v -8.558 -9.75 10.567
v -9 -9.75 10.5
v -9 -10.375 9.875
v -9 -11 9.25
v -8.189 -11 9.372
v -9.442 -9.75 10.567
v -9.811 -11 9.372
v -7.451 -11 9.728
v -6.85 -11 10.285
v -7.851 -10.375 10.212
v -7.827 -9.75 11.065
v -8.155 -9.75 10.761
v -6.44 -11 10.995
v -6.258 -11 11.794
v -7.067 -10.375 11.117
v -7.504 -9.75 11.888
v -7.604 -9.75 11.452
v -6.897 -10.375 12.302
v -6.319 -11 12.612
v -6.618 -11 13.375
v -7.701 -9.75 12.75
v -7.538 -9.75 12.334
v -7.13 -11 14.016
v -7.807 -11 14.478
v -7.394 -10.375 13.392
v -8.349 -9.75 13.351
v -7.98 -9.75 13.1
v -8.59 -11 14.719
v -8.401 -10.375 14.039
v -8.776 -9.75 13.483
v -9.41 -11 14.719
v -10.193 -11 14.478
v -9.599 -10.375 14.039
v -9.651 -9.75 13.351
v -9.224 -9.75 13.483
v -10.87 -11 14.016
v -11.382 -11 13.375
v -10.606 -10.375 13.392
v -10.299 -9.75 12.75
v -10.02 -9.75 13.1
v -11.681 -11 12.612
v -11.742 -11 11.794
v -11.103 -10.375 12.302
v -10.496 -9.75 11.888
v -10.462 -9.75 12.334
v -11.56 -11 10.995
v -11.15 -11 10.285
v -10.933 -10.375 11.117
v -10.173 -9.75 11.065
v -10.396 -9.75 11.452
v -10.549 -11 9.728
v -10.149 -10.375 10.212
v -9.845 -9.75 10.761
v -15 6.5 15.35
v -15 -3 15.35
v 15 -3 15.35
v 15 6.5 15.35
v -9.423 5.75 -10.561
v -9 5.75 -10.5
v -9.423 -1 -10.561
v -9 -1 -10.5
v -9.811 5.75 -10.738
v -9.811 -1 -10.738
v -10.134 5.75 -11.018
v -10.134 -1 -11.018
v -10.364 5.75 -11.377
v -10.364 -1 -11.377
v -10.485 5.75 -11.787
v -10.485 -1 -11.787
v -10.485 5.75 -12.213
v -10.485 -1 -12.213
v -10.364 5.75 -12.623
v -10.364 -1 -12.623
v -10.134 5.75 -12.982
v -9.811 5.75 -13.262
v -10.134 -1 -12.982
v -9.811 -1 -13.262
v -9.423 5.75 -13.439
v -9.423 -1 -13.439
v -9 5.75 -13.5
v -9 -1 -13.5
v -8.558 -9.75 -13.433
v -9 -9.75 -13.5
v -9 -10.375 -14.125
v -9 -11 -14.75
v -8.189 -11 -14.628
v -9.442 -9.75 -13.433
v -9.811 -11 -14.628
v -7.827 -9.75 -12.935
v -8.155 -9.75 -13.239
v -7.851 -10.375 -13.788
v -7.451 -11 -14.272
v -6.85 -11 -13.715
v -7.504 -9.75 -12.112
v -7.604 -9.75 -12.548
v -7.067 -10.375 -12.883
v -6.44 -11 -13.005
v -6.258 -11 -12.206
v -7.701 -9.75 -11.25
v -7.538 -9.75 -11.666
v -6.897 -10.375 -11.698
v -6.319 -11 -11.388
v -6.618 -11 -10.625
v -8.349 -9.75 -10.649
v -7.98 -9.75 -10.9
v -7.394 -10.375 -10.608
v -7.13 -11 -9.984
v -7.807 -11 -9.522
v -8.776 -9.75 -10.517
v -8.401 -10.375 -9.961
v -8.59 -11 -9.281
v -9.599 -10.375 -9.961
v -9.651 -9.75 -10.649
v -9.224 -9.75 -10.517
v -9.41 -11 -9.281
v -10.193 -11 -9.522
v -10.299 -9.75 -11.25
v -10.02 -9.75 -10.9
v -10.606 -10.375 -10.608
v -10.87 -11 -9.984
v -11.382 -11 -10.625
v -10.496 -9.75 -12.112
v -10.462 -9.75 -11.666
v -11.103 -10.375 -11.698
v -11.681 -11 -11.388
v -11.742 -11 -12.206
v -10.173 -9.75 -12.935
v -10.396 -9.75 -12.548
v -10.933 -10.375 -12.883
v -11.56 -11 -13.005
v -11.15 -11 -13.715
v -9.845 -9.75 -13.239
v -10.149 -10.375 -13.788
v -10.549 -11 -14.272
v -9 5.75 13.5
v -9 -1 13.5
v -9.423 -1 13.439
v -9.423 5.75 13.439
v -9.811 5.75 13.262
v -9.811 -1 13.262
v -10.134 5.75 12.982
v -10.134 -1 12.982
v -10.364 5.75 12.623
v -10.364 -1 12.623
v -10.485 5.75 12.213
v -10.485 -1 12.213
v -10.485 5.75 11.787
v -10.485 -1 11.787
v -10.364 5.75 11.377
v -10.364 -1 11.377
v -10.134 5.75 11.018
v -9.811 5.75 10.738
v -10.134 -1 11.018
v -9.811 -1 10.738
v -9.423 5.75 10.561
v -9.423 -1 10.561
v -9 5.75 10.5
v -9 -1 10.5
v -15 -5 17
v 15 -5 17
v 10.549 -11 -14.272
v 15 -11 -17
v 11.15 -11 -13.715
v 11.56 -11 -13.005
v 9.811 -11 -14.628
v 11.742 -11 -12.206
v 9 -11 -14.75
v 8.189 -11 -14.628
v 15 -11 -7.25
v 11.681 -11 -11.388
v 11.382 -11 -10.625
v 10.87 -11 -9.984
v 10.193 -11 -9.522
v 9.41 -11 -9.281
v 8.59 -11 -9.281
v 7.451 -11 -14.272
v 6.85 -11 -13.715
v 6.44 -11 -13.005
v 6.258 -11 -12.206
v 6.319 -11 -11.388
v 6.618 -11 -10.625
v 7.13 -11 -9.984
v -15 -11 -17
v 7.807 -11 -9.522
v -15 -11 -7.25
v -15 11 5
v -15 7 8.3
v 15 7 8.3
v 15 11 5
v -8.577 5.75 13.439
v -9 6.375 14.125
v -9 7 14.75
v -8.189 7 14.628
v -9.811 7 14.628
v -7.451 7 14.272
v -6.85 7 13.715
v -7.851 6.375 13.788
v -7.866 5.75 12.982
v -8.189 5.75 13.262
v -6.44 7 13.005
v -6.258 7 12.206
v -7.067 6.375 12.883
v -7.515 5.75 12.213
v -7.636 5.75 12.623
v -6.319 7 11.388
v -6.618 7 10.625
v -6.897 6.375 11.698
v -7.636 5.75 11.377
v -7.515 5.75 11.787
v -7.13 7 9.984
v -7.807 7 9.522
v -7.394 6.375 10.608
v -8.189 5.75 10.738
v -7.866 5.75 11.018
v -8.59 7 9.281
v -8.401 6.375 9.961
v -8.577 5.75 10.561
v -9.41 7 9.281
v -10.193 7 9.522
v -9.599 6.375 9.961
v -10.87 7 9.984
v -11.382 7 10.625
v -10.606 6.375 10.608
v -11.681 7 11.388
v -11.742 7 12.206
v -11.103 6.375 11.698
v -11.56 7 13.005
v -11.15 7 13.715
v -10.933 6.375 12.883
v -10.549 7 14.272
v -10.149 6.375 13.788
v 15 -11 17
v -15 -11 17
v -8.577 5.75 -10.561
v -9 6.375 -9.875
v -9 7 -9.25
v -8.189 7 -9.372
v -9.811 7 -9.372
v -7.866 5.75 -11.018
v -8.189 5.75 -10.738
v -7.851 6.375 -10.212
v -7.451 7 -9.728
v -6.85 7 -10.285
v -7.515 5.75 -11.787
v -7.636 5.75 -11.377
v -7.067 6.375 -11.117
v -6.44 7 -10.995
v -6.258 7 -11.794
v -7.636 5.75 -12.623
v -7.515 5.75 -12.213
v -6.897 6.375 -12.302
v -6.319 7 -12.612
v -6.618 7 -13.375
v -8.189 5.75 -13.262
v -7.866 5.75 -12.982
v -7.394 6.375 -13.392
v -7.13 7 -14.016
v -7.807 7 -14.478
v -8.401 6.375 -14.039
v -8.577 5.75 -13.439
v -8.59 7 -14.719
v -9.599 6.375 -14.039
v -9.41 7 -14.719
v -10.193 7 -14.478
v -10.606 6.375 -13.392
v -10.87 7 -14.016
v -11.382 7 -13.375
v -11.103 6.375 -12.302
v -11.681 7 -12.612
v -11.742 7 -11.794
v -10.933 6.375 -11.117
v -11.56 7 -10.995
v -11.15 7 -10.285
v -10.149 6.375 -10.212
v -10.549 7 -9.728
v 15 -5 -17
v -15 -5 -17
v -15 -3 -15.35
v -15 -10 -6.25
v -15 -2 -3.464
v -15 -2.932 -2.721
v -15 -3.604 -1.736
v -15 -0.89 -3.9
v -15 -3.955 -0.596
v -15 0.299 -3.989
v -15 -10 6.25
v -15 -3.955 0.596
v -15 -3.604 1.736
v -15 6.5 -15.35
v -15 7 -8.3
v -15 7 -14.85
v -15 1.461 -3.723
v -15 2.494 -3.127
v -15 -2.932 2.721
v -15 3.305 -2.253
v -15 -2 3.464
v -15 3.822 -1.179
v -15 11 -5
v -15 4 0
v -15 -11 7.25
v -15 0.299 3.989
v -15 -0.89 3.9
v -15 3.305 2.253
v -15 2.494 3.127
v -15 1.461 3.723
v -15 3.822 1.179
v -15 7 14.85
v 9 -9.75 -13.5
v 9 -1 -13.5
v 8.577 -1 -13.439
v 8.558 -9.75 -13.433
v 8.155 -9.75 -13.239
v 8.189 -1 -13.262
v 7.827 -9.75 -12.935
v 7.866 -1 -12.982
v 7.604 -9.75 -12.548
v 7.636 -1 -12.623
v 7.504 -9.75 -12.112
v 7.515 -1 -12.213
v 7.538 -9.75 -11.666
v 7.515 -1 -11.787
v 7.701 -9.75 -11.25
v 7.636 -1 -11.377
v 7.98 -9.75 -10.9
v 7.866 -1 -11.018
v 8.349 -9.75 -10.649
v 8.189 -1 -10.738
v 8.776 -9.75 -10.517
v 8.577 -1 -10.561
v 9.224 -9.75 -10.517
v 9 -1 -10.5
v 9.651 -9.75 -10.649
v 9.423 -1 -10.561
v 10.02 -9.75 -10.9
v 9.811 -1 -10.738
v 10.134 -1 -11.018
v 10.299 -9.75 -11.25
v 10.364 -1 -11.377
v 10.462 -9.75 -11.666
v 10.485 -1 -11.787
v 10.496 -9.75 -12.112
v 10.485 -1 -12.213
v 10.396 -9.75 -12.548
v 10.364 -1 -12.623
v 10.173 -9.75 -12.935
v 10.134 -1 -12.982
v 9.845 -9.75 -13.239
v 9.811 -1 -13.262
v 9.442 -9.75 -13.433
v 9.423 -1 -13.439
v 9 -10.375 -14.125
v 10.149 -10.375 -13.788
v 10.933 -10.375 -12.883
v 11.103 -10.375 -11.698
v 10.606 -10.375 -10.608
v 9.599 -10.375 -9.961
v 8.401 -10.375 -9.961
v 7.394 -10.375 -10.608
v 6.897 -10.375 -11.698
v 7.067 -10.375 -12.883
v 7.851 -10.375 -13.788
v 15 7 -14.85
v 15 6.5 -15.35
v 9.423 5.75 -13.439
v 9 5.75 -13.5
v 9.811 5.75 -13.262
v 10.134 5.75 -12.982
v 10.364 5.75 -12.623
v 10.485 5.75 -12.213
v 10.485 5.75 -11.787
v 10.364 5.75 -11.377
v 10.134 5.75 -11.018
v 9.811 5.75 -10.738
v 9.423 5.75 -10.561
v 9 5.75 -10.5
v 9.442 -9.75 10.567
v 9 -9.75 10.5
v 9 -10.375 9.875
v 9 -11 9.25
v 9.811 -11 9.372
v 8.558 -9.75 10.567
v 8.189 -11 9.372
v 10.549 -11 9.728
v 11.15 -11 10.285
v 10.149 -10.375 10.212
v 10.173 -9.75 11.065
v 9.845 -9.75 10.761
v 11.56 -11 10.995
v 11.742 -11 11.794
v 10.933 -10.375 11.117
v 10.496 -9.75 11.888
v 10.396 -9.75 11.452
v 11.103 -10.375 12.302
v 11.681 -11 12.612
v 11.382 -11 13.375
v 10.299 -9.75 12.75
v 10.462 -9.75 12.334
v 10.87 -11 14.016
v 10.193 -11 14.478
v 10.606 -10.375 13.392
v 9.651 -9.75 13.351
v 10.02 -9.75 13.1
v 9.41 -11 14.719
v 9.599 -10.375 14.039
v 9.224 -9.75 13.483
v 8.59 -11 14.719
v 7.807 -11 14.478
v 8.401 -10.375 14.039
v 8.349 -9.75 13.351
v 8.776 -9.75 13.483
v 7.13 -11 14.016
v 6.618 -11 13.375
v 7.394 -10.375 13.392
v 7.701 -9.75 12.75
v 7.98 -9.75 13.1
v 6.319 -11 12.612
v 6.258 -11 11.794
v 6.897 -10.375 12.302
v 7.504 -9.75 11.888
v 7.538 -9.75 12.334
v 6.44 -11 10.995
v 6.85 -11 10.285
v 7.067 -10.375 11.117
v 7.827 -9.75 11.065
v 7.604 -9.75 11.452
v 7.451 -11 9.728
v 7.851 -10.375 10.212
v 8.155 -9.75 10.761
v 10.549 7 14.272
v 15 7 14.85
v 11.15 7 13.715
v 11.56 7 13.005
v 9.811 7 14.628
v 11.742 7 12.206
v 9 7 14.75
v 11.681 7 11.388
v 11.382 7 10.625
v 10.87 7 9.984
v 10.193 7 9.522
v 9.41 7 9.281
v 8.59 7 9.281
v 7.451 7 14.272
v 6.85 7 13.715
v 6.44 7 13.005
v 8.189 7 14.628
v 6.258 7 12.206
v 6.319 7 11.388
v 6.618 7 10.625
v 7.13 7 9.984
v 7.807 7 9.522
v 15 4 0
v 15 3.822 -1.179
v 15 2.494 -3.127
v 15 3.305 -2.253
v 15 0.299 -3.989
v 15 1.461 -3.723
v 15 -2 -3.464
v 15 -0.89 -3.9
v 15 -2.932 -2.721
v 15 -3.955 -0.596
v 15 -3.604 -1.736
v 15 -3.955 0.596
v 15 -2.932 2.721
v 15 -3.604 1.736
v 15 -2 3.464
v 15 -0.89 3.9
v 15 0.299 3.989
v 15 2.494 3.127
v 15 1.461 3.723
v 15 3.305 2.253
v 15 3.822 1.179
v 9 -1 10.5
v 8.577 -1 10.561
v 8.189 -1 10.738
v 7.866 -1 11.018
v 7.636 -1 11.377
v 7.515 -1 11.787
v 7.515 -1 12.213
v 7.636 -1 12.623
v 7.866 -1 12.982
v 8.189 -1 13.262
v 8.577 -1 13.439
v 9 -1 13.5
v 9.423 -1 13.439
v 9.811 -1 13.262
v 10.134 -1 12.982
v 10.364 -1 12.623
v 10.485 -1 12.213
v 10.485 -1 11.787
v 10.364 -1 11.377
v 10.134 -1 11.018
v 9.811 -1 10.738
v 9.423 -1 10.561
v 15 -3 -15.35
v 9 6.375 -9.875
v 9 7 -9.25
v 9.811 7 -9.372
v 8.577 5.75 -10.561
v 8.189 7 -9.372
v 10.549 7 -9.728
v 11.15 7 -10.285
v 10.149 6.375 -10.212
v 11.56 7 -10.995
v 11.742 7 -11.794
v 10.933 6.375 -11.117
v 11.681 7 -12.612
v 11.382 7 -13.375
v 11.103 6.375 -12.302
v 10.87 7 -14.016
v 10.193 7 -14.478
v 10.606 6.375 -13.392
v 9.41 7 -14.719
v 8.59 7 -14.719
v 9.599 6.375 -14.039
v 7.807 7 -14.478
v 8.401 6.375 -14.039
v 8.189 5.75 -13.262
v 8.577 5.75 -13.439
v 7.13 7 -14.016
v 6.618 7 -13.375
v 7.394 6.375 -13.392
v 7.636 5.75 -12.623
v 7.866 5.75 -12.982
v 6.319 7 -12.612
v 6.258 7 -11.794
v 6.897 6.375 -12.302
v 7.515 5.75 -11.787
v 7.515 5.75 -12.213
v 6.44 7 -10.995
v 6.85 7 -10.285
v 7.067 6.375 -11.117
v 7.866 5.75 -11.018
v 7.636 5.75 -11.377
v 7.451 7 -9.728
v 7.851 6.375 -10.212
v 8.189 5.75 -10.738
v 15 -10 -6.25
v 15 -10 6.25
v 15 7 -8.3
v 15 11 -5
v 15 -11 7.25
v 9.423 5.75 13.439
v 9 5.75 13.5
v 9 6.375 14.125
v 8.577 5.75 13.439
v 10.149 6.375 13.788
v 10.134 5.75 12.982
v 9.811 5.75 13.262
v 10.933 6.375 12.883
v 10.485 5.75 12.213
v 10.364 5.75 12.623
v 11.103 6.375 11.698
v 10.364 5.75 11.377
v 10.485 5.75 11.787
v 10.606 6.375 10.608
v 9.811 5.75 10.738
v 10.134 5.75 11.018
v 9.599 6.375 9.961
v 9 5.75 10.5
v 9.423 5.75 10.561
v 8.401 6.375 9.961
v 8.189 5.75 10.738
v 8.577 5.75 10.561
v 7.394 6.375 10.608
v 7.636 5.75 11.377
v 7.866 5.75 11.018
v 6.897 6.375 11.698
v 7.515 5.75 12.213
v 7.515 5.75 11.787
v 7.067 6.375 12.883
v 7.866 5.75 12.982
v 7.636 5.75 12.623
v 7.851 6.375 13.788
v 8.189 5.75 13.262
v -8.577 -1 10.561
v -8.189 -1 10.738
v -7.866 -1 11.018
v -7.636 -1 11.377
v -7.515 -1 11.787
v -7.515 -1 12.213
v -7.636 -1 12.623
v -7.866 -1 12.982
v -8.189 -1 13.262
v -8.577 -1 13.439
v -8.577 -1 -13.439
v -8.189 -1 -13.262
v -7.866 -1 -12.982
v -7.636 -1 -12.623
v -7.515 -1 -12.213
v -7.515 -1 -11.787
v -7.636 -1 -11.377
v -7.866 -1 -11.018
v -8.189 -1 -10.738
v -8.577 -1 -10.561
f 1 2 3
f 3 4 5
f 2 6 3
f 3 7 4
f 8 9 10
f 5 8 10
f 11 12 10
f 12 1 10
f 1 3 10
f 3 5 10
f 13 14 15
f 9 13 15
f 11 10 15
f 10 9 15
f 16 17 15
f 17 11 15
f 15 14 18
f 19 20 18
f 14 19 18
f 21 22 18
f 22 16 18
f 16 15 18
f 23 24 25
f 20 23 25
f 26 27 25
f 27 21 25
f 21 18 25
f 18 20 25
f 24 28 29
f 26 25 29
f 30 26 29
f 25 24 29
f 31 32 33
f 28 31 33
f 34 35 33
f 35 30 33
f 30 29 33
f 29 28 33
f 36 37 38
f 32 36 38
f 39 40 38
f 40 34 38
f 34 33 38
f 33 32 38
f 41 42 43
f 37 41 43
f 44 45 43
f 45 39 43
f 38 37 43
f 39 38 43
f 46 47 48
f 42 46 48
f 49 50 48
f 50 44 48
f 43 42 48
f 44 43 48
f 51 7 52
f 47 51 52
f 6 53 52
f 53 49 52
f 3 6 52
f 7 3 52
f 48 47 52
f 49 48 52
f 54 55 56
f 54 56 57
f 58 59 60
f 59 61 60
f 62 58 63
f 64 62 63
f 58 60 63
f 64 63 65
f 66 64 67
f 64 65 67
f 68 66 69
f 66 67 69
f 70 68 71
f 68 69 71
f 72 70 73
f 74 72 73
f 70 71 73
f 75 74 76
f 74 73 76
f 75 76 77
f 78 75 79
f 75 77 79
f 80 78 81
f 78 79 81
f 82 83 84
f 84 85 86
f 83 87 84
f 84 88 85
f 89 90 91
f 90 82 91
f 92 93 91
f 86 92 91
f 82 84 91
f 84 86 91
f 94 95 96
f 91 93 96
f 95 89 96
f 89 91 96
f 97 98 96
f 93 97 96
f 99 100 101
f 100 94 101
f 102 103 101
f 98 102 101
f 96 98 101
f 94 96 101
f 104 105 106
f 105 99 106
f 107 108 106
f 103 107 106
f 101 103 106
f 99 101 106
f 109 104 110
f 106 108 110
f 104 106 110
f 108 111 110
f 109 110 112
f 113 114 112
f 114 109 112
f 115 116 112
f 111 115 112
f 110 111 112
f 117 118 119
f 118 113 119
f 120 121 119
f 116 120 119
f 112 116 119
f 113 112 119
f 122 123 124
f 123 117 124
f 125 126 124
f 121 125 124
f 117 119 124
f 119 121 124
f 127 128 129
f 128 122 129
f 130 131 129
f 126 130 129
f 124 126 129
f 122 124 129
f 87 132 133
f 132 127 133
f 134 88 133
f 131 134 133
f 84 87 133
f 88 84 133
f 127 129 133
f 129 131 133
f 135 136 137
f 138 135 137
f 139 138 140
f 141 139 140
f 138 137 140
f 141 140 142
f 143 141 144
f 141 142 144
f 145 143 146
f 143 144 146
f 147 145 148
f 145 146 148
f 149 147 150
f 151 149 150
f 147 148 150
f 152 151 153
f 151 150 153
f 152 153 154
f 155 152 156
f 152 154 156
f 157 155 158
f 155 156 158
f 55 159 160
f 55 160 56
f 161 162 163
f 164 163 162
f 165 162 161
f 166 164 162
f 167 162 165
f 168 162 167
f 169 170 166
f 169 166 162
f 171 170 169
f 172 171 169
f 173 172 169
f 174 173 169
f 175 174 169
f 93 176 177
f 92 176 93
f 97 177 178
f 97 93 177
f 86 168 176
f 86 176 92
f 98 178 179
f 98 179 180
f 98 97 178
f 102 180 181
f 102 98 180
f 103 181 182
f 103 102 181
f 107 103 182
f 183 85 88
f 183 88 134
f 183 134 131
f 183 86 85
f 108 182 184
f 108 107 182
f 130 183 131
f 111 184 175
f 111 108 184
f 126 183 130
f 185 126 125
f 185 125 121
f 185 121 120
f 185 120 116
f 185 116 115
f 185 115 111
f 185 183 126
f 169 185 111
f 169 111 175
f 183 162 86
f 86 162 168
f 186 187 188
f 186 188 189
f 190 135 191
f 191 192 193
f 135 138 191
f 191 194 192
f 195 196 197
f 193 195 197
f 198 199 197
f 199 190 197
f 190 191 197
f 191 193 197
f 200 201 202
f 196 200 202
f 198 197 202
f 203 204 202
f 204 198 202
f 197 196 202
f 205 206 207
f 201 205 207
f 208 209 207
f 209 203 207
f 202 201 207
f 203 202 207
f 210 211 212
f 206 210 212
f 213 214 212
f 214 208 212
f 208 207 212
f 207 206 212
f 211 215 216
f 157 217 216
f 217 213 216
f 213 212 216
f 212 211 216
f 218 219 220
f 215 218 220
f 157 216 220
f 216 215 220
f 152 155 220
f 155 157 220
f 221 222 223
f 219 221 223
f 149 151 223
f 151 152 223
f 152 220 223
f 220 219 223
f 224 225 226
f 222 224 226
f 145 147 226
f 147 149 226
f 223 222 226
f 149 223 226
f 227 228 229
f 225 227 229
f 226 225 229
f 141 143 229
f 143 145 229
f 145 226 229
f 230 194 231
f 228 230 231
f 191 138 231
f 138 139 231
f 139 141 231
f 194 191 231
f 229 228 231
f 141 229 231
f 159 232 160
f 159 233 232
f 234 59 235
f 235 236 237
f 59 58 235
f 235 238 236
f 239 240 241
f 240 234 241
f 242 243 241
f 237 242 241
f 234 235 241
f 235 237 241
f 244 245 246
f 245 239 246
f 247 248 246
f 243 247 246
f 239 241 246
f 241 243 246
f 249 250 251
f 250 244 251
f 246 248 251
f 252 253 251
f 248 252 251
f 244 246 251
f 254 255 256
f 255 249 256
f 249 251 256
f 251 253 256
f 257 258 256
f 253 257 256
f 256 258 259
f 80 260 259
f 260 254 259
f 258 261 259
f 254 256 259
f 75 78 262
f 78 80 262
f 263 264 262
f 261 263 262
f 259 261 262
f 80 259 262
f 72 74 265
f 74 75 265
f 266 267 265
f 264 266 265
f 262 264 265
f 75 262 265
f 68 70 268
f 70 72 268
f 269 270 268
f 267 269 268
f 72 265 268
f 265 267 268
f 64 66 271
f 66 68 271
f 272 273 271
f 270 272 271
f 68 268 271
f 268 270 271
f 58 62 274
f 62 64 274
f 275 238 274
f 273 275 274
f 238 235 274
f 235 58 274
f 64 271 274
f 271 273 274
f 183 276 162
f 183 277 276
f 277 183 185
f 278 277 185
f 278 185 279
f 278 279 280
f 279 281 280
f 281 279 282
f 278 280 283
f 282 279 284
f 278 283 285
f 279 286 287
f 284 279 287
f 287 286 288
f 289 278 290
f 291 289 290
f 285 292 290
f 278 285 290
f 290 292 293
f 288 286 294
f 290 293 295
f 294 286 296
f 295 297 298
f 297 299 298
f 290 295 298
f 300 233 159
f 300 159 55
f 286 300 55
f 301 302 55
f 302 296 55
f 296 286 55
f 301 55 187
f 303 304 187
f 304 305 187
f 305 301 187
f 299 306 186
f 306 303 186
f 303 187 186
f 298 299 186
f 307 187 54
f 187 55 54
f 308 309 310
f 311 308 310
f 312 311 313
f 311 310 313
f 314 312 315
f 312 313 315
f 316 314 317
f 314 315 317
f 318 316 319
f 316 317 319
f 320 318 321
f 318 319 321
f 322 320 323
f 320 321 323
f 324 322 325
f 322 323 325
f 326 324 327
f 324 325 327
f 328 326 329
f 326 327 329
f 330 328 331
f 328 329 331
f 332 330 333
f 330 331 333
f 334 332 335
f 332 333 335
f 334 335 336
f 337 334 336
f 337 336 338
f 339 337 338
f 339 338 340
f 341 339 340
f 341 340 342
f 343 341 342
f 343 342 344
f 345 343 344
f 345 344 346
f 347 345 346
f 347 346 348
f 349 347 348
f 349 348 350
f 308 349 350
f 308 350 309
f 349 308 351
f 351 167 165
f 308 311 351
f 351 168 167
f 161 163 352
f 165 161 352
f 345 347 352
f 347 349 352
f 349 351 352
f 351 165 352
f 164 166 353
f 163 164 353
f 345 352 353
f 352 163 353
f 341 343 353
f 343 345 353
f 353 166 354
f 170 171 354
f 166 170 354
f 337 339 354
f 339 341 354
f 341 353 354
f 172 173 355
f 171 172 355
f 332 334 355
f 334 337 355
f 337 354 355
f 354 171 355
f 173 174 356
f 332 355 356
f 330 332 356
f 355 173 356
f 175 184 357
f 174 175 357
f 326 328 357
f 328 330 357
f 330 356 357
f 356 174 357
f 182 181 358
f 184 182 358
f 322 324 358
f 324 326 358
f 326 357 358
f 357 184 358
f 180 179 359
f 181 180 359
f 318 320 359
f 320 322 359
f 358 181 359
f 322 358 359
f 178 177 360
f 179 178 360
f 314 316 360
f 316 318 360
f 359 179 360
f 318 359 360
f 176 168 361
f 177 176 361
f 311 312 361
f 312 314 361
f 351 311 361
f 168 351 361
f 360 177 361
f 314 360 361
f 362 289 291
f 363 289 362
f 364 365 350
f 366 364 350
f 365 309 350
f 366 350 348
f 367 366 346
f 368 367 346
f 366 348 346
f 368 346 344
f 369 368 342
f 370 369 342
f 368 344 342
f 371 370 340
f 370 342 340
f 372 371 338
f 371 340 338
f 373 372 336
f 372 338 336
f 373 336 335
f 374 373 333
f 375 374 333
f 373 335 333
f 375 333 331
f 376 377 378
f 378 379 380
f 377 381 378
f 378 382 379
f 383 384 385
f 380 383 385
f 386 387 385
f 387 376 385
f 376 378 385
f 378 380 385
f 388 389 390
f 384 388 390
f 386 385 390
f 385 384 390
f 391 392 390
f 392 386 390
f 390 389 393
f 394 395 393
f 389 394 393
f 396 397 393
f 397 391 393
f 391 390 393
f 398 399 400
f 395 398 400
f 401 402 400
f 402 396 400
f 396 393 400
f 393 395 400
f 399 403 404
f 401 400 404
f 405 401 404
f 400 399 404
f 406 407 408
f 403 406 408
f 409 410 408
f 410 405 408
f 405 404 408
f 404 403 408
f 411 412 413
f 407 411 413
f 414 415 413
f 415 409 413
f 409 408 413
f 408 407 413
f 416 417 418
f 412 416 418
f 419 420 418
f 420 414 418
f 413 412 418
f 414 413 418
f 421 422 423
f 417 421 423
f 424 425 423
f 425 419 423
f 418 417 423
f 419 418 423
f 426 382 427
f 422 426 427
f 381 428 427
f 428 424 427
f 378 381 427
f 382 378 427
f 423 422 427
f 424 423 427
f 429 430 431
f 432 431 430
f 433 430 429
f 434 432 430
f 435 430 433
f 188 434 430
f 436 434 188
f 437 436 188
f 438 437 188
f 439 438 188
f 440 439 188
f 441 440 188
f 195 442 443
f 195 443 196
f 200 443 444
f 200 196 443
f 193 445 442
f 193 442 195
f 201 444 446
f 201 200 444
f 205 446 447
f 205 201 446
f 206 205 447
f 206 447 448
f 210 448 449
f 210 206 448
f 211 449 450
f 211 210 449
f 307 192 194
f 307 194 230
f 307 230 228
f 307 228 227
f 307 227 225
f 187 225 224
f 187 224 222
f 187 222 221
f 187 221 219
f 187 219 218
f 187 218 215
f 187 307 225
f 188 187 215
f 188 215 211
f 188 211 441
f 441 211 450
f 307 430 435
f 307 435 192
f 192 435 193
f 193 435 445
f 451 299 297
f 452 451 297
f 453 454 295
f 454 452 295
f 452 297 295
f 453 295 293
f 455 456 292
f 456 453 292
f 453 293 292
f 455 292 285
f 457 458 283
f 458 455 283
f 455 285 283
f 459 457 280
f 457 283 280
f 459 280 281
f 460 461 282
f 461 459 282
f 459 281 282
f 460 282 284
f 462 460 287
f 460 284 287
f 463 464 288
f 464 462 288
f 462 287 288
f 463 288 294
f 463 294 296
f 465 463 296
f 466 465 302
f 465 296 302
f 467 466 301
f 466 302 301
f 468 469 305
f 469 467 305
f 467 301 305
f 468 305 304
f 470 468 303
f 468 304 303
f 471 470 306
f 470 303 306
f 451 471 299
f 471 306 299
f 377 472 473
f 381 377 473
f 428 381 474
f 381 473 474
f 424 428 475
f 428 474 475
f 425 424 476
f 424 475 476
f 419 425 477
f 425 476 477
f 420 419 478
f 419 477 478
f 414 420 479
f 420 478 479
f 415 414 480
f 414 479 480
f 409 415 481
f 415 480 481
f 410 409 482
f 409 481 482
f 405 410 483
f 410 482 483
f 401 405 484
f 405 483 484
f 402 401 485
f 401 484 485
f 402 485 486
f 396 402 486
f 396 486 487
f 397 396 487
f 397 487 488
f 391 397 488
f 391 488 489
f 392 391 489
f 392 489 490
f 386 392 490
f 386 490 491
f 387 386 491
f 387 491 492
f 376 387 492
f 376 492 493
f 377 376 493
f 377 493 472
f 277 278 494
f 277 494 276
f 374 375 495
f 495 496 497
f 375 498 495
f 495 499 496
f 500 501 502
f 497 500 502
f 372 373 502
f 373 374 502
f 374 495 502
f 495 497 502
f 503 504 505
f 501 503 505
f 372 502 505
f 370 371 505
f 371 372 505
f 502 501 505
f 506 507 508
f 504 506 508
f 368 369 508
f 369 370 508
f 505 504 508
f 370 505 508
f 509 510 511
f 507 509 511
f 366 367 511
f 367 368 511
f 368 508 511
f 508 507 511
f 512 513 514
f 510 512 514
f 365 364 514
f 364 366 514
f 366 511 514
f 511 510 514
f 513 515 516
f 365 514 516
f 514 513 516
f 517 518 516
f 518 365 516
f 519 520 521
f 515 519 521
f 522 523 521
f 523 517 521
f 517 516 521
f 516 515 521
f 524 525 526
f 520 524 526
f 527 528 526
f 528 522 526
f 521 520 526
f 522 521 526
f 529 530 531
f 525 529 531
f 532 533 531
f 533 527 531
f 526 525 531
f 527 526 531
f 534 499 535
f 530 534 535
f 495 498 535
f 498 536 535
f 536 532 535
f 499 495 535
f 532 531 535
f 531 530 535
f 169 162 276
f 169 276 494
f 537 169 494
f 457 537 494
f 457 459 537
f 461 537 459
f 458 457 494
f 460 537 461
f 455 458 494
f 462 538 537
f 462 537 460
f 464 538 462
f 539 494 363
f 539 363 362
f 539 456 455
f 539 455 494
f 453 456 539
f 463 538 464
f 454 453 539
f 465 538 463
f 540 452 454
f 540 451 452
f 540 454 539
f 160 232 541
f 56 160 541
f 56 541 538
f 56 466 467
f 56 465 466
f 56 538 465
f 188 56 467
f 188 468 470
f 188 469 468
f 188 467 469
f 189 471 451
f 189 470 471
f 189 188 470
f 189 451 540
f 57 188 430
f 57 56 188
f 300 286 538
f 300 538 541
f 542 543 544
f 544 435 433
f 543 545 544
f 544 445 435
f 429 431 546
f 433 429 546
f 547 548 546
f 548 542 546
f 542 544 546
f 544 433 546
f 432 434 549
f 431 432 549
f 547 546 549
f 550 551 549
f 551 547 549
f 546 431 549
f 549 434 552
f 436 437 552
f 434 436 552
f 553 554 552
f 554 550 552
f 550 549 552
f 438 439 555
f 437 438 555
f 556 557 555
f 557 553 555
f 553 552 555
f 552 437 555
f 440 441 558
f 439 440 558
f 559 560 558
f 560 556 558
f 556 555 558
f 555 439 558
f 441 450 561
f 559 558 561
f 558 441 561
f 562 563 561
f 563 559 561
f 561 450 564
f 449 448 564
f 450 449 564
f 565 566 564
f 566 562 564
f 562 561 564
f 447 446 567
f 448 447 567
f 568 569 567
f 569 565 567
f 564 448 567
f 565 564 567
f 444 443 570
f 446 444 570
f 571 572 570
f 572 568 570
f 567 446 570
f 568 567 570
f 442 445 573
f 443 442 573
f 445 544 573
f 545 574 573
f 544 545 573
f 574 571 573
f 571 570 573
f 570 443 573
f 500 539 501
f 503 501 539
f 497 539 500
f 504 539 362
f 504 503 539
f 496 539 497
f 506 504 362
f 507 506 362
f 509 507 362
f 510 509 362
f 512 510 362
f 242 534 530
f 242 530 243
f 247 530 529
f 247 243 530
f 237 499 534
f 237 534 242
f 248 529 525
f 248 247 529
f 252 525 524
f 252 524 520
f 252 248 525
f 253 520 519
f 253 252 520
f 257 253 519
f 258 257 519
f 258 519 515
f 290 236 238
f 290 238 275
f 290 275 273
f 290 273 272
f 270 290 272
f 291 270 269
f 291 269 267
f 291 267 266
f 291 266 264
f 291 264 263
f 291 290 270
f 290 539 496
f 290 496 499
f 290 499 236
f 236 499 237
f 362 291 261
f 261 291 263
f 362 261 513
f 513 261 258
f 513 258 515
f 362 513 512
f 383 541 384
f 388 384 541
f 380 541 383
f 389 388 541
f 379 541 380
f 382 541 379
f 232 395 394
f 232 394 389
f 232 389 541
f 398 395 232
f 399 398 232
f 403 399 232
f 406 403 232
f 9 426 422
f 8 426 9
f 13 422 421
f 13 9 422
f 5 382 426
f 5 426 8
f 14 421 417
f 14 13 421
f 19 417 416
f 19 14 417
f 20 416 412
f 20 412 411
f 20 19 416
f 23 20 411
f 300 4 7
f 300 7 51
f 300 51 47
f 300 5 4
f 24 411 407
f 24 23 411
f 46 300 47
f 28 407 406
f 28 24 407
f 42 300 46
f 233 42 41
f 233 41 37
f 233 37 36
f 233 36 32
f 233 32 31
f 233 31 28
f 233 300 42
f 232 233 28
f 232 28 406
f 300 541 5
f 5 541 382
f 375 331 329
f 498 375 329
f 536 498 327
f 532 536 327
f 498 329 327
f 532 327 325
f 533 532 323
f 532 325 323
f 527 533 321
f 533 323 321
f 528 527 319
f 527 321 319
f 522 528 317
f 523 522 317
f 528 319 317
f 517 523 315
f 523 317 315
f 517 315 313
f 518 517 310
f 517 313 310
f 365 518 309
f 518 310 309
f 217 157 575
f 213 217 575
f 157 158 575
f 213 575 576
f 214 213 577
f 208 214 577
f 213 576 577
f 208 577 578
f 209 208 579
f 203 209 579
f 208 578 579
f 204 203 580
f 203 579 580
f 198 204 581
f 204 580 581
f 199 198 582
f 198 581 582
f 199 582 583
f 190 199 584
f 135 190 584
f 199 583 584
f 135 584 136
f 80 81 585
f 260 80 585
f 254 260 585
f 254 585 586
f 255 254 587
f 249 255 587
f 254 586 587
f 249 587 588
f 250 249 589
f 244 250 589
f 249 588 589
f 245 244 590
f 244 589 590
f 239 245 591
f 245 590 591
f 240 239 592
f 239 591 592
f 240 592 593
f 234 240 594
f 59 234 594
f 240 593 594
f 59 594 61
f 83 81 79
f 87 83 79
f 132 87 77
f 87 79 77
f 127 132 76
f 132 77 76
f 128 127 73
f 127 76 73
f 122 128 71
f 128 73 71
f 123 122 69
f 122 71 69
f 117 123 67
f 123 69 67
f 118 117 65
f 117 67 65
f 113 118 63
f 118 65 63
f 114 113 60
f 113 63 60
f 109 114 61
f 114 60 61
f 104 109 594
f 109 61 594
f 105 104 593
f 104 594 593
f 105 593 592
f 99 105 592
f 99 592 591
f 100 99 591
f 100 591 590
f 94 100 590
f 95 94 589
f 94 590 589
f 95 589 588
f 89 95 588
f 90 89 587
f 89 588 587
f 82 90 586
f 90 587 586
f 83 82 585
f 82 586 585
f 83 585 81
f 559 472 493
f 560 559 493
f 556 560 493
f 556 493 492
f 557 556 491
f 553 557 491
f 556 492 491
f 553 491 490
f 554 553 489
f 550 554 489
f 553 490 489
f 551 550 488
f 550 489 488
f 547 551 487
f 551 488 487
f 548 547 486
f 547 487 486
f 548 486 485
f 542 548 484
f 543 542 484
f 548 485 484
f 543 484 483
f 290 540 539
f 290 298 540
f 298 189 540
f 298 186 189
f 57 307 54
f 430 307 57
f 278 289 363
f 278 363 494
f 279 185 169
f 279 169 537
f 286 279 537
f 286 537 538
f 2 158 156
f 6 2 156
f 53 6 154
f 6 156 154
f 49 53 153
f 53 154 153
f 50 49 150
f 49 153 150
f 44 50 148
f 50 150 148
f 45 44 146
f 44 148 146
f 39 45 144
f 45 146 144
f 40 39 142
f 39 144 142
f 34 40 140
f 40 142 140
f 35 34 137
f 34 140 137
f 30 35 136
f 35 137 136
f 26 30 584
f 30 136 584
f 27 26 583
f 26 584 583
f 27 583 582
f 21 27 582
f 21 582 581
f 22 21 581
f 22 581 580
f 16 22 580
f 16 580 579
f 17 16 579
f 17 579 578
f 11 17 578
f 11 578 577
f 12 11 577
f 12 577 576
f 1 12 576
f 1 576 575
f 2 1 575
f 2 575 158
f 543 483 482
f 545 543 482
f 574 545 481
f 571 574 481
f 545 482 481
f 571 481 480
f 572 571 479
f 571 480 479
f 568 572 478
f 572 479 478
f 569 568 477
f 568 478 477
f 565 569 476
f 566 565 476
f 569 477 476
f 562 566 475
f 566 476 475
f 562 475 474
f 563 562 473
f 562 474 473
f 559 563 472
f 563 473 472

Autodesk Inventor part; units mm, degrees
ref_plane "YZ Plane" through (0, 0, 0) normal (1, 0, 0) x (0, 1, 0)
ref_plane "XZ Plane" through (0, 0, 0) normal (0, 1, 0) x (-1, 0, 0)
ref_plane "XY Plane" through (0, 0, 0) normal (0, 0, 1) x (1, 0, 0)
sketch "Sketch1" plane through (0, 0, 0) normal (1, 0, 0) x (0, 1, 0)
  line L0 (14.2461, 0) -> (-14.2461, 0) construction
  line L1 (11, 5) -> (11, -5)
  line L2 (11, -5) -> (7, -8.3)
  line L3 (7, -8.3) -> (7, -15.35)
  line L4 (7, -15.35) -> (-3, -15.35)
  line L5 (-3, -15.35) -> (-5, -17)
  line L6 (-5, -17) -> (-11, -17)
  line L7 (-11, 17) -> (-5, 17)
  line L8 (-5, 17) -> (-3, 15.35)
  line L9 (-3, 15.35) -> (7, 15.35)
  line L10 (7, 15.35) -> (7, 8.3)
  line L11 (7, 8.3) -> (11, 5)
  line L12 (-11, -17) -> (-11, -7.25)
  line L13 (-11, -7.25) -> (-10, -6.25)
  line L14 (-10, -6.25) -> (-10, 6.25)
  line L15 (-10, 6.25) -> (-11, 7.25)
  line L16 (-11, 7.25) -> (-11, 17)
  circle A0 centre (0, 0) radius 4
  point P0 (-11, -12.125)
  dimension "d2" = 45
  dimension "d3" = 22
  dimension "d4" = 34
  dimension "d5" = 6
  dimension "d6" = 8
  dimension "d7" = 11
  dimension "d8" = 8
  dimension "d9" = 18
  dimension "d10" = 16.6
  dimension "d11" = 12.5
  dimension "d12" = 1
  dimension "d13" = 10
extrude "Extrusion1" add sketch "Sketch1" along normal mid plane 30
sketch "Sketch2" plane through (-15, 7, 15.35) normal (0, 1, 0) x (1, 0, 0)
  line L0 (-4.3659, 15.35) -> (34.0137, 15.35) construction
  line L1 (0, 10.35) -> (0, 20.35) projected
  line L2 (0, 10.35) -> (30, 10.35) projected
  line L3 (15, 2.4961) -> (15, 28.0168) construction
  point P0 (15, 15.35)
  point P1 (6, 3.35)
  point P2 (6, 27.35)
  point P3 (24, 27.35)
  point P4 (24, 3.35)
  point P5 (0, 15.35)
  point P6 (15, 10.35)
  dimension "d16" = 24
  dimension "d17" = 18
hole "Hole1" at (-9, 7, 12) at (-9, 7, -12) at (9, 7, -12) at (9, 7, 12) direction (0, -1, 0) diameter 3 depth 8 countersink diameter 5.5 countersink angle 90
sketch "Sketch3" plane through (-15, -11, 7.25) normal (0, -1, 0) x (1, 0, 0)
  point P0 (15, -7.25)
  point P1 (6, 4.75)
  point P2 (24, 4.75)
  point P3 (6, -19.25)
  point P4 (24, -19.25)
hole "Hole2" at (-9, -11, 12) at (9, -11, 12) at (-9, -11, -12) at (9, -11, -12) direction (0, 1, 0) diameter 3 end through all countersink diameter 5.5 countersink angle 90
chamfer "Chamfer1" distance 0.5 angle 45 2 edges at (0, 7, 15.35) (0, 7, -15.35)
properties part number "Bearing block"
